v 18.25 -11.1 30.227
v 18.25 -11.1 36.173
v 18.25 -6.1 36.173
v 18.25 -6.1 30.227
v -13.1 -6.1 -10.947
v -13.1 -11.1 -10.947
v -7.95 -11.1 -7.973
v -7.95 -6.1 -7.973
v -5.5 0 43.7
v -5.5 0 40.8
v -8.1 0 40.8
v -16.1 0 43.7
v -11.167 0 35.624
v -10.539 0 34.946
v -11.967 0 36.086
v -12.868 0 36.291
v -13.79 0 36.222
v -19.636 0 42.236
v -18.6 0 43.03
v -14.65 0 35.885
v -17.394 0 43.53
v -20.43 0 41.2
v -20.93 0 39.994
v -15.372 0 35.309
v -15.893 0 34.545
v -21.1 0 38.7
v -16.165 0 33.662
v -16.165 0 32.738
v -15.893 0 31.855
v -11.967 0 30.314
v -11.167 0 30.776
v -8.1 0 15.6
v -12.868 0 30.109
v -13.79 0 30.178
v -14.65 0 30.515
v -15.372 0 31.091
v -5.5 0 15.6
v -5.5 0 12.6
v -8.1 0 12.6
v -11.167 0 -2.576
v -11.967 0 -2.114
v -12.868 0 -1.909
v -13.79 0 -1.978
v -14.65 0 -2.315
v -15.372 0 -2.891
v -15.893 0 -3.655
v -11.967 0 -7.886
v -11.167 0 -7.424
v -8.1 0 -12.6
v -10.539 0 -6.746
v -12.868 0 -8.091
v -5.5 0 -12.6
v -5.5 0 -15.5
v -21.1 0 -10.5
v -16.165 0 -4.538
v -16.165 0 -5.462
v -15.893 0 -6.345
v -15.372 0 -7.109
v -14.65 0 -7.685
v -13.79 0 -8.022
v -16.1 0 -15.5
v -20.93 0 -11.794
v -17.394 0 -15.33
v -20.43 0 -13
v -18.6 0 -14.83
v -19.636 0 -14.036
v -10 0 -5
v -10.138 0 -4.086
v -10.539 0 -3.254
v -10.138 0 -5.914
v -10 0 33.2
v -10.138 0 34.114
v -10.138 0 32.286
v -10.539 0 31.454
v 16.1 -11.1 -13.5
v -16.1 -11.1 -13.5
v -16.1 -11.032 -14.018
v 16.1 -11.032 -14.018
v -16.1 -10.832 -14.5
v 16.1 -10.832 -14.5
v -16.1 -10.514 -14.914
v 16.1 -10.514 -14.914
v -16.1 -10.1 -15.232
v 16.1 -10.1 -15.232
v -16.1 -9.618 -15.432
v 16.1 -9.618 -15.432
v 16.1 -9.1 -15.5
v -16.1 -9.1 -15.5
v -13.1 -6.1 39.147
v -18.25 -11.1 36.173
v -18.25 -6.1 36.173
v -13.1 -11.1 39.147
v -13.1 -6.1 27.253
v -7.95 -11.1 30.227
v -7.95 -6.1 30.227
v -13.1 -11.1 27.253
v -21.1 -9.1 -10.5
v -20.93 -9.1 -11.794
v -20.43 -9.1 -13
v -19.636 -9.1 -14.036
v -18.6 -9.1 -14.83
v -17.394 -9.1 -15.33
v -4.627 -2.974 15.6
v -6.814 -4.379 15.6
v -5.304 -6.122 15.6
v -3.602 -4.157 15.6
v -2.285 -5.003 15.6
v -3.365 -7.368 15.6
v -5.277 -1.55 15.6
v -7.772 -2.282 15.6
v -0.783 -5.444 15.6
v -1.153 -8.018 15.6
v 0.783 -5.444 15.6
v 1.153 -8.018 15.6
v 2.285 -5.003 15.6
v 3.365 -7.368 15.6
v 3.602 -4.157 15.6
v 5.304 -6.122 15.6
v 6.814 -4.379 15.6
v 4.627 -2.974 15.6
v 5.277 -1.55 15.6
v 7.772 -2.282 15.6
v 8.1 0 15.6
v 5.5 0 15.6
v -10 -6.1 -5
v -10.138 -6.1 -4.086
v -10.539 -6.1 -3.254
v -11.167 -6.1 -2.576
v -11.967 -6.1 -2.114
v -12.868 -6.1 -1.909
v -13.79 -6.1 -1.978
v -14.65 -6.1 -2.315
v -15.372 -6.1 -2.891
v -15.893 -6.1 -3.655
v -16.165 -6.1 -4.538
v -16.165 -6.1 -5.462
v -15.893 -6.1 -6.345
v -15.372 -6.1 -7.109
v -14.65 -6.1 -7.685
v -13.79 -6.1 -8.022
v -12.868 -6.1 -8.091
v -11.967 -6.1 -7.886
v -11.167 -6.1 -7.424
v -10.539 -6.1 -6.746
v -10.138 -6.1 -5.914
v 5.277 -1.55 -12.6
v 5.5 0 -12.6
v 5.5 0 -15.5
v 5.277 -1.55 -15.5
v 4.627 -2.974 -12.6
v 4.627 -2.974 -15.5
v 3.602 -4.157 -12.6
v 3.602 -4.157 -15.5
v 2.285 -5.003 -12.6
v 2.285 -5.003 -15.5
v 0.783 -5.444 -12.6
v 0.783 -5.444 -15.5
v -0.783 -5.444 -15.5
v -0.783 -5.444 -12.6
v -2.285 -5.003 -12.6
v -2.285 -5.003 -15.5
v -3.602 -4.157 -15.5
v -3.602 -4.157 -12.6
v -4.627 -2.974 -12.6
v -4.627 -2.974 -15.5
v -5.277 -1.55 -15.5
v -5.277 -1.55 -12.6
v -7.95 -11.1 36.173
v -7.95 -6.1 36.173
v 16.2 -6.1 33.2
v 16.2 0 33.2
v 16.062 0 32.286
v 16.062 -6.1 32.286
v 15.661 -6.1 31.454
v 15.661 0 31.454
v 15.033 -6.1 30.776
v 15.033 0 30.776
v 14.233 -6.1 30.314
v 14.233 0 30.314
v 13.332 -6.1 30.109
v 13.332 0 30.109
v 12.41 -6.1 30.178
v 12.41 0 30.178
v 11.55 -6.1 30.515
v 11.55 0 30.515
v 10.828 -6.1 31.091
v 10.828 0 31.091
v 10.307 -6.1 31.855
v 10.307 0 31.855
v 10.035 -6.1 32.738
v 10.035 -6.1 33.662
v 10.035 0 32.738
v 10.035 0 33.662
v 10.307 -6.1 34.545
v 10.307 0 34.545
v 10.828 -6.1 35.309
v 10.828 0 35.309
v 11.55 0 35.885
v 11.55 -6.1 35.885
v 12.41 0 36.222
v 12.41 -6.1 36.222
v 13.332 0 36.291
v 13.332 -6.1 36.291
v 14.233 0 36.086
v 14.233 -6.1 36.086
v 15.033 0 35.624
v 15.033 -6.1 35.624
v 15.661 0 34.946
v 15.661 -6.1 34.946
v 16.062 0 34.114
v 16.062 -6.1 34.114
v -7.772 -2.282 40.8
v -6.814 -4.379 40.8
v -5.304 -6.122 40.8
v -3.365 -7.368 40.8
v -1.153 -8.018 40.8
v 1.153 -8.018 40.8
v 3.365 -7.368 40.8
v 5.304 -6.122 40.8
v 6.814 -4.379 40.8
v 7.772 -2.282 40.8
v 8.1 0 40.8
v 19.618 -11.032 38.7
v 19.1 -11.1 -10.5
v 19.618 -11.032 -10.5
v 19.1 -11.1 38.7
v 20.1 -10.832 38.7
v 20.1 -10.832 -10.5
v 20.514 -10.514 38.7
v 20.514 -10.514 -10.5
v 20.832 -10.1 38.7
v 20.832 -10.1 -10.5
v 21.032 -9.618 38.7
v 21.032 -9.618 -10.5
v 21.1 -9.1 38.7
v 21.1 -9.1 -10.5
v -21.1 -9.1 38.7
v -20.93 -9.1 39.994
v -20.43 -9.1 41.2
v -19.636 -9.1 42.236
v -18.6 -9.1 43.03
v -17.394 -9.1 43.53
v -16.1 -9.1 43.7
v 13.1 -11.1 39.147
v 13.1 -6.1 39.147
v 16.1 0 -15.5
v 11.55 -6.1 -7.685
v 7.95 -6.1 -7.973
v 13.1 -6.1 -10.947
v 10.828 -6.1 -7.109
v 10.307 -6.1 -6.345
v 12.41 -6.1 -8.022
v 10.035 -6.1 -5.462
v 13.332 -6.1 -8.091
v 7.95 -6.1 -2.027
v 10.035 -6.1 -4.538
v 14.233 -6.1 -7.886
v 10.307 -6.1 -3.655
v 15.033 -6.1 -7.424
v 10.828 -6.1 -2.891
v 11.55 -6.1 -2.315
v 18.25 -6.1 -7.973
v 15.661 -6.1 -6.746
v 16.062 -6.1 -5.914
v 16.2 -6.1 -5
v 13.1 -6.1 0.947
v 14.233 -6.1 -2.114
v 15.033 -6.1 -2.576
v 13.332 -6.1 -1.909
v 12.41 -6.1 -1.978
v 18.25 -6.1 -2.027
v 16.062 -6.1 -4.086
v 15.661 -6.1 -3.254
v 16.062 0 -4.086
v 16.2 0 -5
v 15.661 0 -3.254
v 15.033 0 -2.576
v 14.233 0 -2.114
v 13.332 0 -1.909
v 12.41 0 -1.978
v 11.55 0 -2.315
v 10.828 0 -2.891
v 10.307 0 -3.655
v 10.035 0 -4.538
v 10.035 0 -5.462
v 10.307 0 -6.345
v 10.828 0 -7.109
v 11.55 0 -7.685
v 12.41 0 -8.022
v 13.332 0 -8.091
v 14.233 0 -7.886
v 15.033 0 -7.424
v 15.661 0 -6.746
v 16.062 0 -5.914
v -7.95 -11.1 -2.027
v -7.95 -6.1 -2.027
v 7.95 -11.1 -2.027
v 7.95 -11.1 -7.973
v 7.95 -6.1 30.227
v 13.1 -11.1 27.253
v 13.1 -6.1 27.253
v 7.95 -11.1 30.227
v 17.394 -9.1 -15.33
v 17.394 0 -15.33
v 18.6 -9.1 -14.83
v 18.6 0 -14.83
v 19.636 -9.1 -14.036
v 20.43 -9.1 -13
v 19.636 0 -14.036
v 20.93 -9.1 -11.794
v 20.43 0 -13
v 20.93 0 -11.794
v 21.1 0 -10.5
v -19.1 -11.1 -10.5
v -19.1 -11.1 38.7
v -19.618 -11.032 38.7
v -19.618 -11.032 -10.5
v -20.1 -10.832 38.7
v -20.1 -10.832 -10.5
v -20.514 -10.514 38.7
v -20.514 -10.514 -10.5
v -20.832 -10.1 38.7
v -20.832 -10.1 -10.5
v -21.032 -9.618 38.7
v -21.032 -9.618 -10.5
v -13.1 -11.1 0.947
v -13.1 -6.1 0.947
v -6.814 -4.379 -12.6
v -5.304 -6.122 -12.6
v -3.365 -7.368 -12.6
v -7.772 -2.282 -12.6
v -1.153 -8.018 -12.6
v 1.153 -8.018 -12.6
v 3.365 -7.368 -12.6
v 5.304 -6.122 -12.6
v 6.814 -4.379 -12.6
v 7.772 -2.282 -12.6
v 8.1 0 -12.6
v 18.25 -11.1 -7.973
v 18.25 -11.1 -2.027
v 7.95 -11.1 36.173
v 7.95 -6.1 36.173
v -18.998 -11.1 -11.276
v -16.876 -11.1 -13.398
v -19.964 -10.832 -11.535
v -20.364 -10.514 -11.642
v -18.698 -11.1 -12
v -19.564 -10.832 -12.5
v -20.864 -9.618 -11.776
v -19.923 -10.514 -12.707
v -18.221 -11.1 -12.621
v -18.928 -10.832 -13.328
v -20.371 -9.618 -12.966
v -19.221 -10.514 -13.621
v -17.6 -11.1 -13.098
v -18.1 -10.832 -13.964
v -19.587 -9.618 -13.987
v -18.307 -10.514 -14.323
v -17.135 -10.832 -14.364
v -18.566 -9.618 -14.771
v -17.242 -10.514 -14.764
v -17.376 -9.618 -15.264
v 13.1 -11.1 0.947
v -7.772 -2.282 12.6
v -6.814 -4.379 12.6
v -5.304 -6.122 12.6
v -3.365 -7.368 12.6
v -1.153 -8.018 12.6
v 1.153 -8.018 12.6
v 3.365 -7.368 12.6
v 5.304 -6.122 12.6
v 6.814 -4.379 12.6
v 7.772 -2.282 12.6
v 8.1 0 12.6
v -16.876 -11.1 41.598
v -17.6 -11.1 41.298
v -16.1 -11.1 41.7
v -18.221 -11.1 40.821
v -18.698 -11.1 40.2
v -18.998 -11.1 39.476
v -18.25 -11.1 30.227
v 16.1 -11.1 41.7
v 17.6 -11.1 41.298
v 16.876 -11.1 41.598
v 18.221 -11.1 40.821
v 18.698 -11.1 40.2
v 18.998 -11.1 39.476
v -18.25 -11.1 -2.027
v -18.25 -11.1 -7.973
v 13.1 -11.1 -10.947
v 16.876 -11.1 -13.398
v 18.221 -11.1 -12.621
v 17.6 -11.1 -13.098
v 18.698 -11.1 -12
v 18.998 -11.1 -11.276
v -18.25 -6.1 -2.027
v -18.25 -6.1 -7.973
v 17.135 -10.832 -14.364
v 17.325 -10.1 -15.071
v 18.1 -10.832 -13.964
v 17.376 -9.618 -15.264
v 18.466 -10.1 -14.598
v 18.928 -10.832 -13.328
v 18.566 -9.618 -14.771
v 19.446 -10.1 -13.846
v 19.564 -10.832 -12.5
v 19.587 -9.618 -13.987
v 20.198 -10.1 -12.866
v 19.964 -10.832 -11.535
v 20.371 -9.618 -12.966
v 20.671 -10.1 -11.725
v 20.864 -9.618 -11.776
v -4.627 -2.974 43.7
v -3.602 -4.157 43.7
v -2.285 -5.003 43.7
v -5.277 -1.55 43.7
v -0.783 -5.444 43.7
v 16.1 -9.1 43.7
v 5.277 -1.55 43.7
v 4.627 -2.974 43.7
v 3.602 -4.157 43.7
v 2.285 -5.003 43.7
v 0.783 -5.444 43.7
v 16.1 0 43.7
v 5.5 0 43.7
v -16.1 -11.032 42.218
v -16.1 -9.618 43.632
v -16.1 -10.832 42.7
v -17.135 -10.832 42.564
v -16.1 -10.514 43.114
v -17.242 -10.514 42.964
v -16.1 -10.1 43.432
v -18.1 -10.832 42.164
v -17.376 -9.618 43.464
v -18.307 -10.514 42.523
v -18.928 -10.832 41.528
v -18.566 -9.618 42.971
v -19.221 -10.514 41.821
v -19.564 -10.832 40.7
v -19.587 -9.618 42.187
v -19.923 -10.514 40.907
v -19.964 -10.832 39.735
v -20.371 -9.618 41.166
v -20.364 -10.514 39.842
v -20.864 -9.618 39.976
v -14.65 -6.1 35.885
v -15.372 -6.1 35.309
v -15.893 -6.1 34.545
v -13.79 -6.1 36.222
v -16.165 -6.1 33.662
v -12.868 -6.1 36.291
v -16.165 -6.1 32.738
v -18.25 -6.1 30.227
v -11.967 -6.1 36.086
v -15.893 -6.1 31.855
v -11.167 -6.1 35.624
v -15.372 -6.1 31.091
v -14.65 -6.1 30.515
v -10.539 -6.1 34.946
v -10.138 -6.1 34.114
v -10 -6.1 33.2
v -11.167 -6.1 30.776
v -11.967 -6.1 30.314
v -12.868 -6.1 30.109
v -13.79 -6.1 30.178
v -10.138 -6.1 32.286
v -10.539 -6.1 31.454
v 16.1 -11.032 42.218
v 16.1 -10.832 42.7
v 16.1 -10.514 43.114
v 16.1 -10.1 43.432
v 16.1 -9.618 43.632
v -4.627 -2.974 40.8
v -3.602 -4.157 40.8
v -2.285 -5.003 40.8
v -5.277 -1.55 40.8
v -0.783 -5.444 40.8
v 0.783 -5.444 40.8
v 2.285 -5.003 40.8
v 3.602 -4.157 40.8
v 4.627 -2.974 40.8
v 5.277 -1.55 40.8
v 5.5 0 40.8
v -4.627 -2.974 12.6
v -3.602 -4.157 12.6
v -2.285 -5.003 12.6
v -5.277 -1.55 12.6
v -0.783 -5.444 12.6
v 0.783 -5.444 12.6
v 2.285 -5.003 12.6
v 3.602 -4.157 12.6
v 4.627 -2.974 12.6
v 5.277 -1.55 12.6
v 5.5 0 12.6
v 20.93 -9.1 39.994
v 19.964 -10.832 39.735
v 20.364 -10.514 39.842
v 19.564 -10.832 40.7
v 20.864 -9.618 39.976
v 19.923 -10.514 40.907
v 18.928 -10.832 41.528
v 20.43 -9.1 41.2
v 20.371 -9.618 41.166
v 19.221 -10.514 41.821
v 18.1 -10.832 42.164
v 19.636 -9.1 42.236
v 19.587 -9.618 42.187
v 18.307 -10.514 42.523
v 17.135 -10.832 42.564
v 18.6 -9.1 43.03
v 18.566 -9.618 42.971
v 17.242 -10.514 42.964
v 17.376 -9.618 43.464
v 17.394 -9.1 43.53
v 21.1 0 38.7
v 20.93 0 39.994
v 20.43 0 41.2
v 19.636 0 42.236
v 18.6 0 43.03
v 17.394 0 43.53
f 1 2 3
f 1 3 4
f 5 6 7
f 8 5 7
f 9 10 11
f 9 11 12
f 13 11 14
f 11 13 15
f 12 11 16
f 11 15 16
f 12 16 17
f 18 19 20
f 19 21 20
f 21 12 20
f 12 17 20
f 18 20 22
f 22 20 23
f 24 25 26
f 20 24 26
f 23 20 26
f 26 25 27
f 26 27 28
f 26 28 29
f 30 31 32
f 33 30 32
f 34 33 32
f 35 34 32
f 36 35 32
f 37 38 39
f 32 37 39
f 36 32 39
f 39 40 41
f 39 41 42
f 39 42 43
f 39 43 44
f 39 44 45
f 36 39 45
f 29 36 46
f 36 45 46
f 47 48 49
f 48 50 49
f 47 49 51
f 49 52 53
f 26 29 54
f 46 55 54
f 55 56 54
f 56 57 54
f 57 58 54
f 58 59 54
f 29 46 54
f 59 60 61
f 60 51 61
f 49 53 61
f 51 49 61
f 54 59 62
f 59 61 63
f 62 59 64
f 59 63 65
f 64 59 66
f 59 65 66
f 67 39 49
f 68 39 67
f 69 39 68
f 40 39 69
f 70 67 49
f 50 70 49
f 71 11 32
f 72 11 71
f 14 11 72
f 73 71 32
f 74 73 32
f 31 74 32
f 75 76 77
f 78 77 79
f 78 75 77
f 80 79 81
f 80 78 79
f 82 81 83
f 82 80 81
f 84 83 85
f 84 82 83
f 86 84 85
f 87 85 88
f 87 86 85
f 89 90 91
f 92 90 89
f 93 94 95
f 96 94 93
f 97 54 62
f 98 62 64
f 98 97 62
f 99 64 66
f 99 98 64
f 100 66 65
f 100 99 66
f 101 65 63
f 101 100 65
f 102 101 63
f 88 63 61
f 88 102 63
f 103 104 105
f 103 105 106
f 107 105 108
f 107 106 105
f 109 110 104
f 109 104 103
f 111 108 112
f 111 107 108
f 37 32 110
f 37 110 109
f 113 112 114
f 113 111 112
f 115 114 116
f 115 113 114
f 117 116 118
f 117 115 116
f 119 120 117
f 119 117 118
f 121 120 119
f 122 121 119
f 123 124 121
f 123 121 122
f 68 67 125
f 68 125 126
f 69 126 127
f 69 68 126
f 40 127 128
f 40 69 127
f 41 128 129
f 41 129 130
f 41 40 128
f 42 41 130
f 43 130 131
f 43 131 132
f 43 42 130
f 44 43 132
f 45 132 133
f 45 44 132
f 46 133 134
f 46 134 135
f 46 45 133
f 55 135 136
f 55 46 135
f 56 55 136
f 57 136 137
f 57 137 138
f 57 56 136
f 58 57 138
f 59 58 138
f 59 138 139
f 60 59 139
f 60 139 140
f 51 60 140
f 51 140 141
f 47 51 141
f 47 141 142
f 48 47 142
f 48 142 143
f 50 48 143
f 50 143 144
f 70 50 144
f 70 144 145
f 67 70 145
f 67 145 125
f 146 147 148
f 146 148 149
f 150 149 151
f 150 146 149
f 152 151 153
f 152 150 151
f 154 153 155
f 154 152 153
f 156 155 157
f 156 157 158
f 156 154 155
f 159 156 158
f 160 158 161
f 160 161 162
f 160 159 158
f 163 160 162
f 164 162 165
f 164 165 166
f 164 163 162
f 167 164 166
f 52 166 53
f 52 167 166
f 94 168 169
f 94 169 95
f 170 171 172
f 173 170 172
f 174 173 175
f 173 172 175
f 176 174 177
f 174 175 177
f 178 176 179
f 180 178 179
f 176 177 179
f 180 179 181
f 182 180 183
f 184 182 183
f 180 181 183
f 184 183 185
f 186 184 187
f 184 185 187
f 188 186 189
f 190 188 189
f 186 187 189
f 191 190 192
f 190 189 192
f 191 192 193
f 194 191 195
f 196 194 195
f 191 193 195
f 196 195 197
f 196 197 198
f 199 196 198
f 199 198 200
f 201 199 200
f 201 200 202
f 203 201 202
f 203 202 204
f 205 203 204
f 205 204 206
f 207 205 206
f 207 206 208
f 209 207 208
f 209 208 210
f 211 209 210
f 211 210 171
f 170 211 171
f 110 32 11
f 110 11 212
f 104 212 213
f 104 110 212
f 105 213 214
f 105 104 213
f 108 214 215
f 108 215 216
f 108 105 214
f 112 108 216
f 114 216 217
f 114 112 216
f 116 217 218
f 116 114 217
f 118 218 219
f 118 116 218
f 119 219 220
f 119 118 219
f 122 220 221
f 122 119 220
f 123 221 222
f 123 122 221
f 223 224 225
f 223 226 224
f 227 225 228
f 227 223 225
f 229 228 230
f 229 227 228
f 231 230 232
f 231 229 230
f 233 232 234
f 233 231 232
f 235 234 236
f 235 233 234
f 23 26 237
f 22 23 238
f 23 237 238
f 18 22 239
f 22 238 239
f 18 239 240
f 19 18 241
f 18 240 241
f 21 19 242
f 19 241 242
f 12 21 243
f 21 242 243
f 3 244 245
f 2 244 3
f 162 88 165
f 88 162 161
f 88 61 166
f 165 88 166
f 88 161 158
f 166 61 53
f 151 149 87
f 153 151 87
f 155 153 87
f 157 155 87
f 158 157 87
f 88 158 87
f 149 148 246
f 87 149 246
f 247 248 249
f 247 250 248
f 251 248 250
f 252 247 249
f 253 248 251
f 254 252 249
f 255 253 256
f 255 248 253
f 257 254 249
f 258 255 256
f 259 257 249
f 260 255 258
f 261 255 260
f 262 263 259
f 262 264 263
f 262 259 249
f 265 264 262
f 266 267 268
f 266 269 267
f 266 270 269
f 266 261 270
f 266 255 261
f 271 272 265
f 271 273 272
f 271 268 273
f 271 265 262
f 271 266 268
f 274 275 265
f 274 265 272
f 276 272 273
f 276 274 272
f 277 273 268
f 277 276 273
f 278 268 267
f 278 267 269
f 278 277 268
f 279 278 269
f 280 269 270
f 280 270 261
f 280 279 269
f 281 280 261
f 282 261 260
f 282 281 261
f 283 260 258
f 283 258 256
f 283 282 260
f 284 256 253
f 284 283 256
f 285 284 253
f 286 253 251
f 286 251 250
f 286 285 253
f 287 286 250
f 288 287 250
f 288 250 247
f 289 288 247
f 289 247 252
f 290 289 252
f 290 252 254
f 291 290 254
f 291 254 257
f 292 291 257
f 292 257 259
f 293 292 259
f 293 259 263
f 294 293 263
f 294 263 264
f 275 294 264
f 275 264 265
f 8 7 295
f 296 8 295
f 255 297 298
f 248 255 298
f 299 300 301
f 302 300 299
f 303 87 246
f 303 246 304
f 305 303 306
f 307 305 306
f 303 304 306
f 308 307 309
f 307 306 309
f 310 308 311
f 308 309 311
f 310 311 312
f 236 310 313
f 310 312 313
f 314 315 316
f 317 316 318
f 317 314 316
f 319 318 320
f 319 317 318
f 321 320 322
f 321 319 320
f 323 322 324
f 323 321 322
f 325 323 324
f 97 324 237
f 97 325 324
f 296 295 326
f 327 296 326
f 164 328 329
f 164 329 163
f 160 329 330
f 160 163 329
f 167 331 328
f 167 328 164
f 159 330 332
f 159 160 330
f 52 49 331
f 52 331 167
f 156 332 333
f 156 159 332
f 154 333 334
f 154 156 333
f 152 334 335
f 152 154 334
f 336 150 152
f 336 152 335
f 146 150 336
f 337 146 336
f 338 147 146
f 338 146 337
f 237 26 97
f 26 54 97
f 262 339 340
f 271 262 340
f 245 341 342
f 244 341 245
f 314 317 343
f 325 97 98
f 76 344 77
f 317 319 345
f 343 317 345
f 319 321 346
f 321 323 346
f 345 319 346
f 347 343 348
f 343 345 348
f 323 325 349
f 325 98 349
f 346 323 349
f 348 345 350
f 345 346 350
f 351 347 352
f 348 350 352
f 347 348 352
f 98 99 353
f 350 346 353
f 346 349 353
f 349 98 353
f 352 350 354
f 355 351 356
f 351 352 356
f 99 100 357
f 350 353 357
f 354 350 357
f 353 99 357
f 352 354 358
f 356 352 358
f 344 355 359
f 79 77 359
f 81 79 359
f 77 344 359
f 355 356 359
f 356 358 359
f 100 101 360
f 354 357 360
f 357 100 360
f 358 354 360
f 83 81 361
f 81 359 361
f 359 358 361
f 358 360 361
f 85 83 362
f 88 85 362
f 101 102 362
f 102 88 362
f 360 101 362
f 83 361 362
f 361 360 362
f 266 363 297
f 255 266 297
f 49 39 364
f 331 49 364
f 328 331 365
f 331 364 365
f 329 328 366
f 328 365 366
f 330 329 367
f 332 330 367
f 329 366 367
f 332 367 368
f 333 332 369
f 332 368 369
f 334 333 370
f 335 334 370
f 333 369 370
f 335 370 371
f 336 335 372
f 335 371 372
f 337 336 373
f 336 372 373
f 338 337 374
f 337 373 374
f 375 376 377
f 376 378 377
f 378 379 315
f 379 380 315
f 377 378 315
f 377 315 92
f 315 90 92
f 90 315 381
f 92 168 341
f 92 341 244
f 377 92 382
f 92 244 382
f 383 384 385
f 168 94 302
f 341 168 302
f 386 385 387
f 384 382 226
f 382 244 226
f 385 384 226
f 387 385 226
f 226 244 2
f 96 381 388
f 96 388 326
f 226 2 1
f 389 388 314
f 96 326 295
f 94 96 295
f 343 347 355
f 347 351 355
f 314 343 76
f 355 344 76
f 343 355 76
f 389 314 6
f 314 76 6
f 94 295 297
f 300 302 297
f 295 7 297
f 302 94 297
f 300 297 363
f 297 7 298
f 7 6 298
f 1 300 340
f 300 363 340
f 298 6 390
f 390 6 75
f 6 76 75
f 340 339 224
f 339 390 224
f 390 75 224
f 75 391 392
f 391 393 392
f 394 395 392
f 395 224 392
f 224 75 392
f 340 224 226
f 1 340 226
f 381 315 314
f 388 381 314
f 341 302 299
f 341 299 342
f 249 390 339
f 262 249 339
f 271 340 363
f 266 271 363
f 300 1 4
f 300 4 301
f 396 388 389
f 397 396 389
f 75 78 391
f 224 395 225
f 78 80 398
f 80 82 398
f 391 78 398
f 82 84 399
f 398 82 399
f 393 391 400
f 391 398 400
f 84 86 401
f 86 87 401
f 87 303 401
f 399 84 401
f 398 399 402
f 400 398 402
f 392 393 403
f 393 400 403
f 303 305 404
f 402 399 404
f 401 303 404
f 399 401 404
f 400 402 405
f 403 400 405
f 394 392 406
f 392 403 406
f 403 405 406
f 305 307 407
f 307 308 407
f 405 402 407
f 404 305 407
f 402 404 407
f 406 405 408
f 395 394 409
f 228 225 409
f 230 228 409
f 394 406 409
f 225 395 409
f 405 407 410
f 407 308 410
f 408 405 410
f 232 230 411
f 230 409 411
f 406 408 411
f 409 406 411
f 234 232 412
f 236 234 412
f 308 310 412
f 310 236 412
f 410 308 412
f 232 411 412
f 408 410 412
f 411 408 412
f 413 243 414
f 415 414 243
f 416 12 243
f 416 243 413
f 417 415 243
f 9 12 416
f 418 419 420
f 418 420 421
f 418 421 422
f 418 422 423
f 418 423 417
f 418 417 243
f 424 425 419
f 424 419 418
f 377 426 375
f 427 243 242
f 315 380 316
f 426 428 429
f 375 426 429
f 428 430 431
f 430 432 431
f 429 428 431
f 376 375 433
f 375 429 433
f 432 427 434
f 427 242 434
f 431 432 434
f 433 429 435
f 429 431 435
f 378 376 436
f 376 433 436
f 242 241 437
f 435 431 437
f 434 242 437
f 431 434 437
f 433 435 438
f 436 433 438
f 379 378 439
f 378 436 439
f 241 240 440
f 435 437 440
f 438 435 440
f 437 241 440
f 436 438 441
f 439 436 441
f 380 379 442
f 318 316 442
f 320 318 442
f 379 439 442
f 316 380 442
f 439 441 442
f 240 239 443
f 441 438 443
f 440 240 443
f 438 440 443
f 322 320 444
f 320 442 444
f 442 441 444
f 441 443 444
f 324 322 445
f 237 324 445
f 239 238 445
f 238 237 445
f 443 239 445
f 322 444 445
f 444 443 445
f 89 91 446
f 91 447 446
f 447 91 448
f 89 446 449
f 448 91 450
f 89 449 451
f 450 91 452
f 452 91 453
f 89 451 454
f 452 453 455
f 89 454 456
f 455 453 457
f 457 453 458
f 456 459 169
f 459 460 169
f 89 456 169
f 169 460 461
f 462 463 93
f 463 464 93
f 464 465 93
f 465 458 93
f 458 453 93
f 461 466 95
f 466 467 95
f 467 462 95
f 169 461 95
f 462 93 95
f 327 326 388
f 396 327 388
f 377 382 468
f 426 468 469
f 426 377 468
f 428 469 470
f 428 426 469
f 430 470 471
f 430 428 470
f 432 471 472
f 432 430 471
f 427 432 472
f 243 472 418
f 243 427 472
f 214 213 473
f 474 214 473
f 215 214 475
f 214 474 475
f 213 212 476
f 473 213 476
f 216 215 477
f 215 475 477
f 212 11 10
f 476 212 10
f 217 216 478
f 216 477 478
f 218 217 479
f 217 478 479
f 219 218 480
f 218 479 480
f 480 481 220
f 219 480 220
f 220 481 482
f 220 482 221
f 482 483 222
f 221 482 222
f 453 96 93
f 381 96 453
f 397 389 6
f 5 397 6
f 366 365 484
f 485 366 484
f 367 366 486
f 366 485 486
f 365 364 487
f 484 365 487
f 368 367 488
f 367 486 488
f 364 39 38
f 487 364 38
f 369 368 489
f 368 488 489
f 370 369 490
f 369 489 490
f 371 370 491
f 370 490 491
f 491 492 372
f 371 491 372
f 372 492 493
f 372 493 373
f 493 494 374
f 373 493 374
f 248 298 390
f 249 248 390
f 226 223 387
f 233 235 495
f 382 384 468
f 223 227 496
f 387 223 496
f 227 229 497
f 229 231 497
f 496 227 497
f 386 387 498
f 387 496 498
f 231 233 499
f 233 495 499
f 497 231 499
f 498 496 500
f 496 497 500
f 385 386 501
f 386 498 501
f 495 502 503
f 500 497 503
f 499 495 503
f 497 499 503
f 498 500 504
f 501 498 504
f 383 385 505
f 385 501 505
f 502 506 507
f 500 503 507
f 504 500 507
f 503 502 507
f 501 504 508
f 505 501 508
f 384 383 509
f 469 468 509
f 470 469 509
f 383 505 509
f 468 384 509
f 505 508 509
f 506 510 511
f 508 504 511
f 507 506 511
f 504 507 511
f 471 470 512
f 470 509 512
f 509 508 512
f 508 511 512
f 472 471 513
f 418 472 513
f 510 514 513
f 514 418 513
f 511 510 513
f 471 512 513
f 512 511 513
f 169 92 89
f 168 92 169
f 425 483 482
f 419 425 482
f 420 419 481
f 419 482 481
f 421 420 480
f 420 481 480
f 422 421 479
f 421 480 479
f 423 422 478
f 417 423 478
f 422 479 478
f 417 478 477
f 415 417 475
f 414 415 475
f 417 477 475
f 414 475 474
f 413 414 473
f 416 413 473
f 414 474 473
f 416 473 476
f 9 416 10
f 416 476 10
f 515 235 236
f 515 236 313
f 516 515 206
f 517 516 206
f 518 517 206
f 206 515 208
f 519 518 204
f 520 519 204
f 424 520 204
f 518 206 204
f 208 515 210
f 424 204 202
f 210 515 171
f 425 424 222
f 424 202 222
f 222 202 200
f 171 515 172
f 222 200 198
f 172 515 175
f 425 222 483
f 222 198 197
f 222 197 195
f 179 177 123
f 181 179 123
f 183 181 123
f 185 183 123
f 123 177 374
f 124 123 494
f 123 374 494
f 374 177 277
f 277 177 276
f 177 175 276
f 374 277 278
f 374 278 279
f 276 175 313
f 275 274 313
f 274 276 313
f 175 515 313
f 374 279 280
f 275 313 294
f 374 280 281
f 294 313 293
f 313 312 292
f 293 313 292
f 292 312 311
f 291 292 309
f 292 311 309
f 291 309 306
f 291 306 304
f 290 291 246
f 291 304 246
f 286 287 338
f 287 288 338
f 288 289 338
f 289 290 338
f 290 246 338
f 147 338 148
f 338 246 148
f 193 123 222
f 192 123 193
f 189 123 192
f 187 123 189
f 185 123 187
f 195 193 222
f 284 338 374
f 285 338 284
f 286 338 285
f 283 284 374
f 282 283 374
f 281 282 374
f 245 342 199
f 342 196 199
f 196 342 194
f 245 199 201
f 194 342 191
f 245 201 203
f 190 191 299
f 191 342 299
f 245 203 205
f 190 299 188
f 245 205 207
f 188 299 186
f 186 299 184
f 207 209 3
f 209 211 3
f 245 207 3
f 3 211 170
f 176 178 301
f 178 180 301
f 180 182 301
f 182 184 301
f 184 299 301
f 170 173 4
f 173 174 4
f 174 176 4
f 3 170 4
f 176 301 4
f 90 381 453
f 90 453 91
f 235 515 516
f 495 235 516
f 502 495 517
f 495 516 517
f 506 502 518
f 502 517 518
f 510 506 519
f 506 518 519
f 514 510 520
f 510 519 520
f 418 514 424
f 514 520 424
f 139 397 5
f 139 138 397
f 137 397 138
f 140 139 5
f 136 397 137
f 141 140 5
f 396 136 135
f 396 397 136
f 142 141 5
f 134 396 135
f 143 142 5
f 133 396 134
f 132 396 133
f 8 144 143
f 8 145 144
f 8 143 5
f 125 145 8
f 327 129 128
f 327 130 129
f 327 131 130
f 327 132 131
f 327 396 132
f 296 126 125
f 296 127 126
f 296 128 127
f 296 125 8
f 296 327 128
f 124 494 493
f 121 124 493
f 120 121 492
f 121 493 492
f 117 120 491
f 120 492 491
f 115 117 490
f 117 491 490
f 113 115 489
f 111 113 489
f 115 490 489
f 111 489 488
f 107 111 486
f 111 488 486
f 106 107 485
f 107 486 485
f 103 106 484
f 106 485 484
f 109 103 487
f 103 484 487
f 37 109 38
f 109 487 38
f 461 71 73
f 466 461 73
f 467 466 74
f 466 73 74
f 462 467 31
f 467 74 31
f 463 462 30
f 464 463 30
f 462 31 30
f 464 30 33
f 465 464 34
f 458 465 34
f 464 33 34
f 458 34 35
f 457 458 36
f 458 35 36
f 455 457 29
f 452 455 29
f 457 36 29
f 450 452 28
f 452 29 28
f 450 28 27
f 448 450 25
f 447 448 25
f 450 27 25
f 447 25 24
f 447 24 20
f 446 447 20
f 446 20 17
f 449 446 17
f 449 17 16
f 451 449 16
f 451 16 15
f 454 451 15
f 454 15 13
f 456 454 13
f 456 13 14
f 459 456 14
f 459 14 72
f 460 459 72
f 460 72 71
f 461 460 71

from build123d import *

# Parameters (mm, degrees)
F1_DEPTH = 15.5
F2_DEPTH = 12.6
F3_R     = 3.1
F4_DEPTH = 11.101
F6_R     = 3.1
F7_DEPTH = 5
F9_R     = 5
F10_R    = 2


# Not quite as in the source:
# - a feature names something its author has since deleted; it is built from what else it names


with BuildPart() as f1:
    # F0 (on Top) → F1 (new body, symmetric)
    with BuildSketch(Plane.XY):
        with BuildLine():
            Line((-8.1, 0), (-21.1, 0))
            Line((-21.1, 0), (-21.1, -11.1))
            Line((-21.1, -11.1), (21.1, -11.1))
            Line((21.1, -11.1), (21.1, 0))
            Line((21.1, 0), (8.1, 0))
            ThreePointArc((8.1, 0), (0, -8.1), (-8.1, 0))
        make_face()
        with BuildLine():
            Line((-5.5, 0), (-8.1, 0))
            ThreePointArc((-8.1, 0), (0, -8.1), (8.1, 0))
            Line((8.1, 0), (5.5, 0))
            ThreePointArc((5.5, 0), (0, -5.5), (-5.5, 0))
        make_face()
    extrude(amount=F1_DEPTH, both=True)

    # F0 (on Top) → F2 (cut, symmetric)
    with BuildSketch(Plane.XY):
        with BuildLine():
            Line((-5.5, 0), (-8.1, 0))
            ThreePointArc((-8.1, 0), (0, -8.1), (8.1, 0))
            Line((8.1, 0), (5.5, 0))
            ThreePointArc((5.5, 0), (0, -5.5), (-5.5, 0))
        make_face()
    extrude(amount=F2_DEPTH, both=True, mode=Mode.SUBTRACT)

    # F3 (on Front) → F4 (cut, through all)
    with BuildSketch(Plane.XZ):
        with Locations((13.1, -5)):
            Circle(F3_R)
        with Locations((-13.1, -5)):
            Circle(F3_R)
    extrude(amount=F4_DEPTH, mode=Mode.SUBTRACT)

    # F6 (on face) → F7 (cut)
    with BuildSketch(Plane.XZ.offset(11.1)):
        Polygon((7.95, -2.0266461137), (7.95, -7.9733538863), (13.1, -10.9467077727), (18.25, -7.9733538863), (18.25, -2.0266461137), (13.1, 0.9467077727), align=None)
        with Locations((13.1, -5)):
            Circle(F6_R, mode=Mode.SUBTRACT)
        Polygon((-18.25, -7.9733538863), (-13.1, -10.9467077727), (-7.95, -7.9733538863), (-7.95, -2.0266461137), (-13.1, 0.9467077727), (-18.25, -2.0266461137), align=None)
        with Locations((-13.1, -5)):
            Circle(F6_R, mode=Mode.SUBTRACT)
    extrude(amount=-F7_DEPTH, mode=Mode.SUBTRACT)

    # F8: F1 across plane


with BuildPart() as f1_1:
    add(f1.part)
    add(f1.part.mirror(Plane(origin=(0, -5.9130296111, 14.1), x_dir=(1, 0, 0), z_dir=(0, 0, 1))))

    # F9
    f9_edges = [f1_1.edges().sort_by_distance(p)[0] for p in [
        (21.1, -5.55, 43.7),
        (21.1, -5.55, -15.5),
        (-21.1, -5.55, -15.5),
        (-21.1, -5.55, 43.7),
    ]]
    fillet(f9_edges, radius=F9_R)

    # F10
    f10_edges = [f1_1.edges().sort_by_distance(p)[0] for p in [
        (21.1, -11.1, 14.1),
        (19.635534, -11.1, -14.035534),
        (-21.1, -11.1, 14.1),
        (-19.635534, -11.1, -14.035534),
        (-19.635534, -11.1, 42.235534),
        (0, -11.1, -15.5),
        (0, -11.1, 43.7),
        (19.635534, -11.1, 42.235534),
    ]]
    fillet(f10_edges, radius=F10_R)


solid = f1_1.part
